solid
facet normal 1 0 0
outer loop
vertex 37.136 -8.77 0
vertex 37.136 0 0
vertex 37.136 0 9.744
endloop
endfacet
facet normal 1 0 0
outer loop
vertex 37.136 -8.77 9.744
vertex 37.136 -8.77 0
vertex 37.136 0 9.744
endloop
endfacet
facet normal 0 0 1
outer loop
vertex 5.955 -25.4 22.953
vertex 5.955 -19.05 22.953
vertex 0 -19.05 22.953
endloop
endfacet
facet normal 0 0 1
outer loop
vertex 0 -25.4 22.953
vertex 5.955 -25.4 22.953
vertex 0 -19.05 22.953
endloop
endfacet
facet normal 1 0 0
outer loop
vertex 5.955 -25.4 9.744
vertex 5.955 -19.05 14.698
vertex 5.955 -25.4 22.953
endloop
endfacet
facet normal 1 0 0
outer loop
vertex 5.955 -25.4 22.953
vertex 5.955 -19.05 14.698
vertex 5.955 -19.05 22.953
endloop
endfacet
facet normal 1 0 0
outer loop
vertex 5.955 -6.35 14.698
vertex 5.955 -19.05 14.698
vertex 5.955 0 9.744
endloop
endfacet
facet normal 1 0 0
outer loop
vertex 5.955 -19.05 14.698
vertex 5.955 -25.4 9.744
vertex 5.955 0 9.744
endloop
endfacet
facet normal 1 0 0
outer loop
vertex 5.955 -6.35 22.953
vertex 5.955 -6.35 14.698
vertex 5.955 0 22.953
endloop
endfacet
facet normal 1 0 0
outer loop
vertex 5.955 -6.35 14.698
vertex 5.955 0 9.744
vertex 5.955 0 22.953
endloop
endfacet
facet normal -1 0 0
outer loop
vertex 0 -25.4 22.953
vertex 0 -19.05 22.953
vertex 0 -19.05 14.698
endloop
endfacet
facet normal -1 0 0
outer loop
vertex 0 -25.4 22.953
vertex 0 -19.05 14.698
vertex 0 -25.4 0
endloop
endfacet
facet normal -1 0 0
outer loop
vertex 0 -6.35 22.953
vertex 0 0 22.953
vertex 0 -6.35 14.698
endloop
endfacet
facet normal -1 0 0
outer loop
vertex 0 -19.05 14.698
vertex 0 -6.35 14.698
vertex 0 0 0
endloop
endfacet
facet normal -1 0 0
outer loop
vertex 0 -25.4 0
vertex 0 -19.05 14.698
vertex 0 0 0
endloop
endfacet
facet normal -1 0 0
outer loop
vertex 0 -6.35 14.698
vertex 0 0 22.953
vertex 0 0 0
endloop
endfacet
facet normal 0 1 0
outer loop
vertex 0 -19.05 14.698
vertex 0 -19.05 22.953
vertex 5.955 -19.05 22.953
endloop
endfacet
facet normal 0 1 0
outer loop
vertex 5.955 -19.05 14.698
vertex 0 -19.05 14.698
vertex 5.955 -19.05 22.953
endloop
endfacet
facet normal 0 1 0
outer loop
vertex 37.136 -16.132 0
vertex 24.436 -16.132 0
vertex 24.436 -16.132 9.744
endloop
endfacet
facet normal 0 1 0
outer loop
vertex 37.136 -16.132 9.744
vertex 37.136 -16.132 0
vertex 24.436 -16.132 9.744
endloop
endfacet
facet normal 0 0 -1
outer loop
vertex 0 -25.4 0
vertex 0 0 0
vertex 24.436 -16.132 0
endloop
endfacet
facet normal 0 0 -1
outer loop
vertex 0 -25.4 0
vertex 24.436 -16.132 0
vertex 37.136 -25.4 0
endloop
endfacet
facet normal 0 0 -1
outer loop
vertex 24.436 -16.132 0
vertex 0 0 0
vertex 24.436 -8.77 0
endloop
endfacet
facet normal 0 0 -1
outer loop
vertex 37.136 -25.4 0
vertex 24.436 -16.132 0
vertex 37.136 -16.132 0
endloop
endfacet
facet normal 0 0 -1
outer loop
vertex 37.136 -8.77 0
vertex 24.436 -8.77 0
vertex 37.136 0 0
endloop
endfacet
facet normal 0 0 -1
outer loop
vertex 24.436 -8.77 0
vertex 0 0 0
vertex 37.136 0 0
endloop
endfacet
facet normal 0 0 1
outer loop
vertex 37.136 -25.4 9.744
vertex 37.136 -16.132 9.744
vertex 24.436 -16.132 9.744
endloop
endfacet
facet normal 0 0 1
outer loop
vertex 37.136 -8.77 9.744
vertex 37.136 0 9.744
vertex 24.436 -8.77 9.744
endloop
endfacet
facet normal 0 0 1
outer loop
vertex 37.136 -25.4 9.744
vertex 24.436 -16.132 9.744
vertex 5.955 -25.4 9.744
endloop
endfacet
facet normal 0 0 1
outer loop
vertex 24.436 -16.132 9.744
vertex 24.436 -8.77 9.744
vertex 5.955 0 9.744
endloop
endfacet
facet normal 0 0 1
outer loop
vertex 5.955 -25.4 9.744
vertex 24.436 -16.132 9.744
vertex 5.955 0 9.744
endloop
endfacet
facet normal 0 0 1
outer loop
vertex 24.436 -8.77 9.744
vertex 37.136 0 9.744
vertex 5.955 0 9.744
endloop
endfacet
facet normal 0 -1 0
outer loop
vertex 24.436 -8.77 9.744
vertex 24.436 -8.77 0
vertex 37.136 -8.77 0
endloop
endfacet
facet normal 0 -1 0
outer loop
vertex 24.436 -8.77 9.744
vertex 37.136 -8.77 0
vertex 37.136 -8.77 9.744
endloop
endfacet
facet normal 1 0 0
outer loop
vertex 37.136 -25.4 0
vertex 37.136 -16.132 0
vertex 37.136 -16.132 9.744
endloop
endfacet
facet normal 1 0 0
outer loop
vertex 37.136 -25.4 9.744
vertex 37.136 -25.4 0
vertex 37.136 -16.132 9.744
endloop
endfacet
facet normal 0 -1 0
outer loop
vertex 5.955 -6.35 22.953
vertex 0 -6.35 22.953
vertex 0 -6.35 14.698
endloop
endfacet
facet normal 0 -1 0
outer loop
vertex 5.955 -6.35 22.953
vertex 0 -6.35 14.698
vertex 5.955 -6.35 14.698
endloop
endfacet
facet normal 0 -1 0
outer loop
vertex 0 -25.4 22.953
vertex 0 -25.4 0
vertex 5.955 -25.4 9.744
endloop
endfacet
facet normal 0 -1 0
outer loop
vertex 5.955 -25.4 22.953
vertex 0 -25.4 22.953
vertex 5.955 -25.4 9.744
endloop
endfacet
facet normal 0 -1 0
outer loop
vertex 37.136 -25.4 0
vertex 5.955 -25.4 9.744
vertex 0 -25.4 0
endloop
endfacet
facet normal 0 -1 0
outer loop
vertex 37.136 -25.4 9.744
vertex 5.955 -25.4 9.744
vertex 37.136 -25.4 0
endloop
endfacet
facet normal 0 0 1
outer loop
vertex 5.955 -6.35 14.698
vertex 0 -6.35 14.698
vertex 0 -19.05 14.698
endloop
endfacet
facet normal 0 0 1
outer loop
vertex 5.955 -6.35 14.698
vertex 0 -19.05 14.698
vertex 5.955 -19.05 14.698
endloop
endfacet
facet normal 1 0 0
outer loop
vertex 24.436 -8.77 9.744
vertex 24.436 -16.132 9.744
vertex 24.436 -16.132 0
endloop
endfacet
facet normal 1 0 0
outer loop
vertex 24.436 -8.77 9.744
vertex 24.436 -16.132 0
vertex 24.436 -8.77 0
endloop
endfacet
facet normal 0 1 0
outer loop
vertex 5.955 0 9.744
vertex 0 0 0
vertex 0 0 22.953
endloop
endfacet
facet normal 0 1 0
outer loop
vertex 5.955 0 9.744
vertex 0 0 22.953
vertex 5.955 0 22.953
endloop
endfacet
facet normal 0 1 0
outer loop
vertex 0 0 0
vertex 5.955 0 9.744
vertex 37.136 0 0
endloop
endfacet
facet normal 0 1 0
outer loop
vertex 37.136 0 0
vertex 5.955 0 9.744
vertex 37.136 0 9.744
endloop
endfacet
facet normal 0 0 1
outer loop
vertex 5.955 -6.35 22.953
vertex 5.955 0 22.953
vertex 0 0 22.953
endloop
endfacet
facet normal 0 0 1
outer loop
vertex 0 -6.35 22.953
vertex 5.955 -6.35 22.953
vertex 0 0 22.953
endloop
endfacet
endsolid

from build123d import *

# Parameters (mm, degrees)
F1_DEPTH = 25.4
F2_W     = 5.954736
F2_H     = 12.7
F3_DEPTH = 8.255
F4_W     = 7.362218
F4_H     = 9.744114
F5_DEPTH = 12.7


with BuildPart() as f1:
    # F0 (on Front) → F1 (new body)
    with BuildSketch(Plane.XZ):
        Polygon((0, 22.952802), (0, 0), (37.135903, 0), (37.135903, 9.744114), (5.954736, 9.744114), (5.954736, 22.952802), align=None)
    extrude(amount=F1_DEPTH)

    # F2 (on face) → F3 (cut, symmetric)
    with BuildSketch(Plane.XY.offset(22.952802)):
        with Locations((2.977368, -12.7)):
            Rectangle(F2_W, F2_H)
    extrude(amount=F3_DEPTH, both=True, mode=Mode.SUBTRACT)

    # F4 (on face) → F5 (cut, symmetric)
    with BuildSketch(Plane.YZ.offset(37.135903)):
        with Locations((-12.450812, 4.872057)):
            Rectangle(F4_W, F4_H)
    extrude(amount=F5_DEPTH, both=True, mode=Mode.SUBTRACT)


solid = f1.part
